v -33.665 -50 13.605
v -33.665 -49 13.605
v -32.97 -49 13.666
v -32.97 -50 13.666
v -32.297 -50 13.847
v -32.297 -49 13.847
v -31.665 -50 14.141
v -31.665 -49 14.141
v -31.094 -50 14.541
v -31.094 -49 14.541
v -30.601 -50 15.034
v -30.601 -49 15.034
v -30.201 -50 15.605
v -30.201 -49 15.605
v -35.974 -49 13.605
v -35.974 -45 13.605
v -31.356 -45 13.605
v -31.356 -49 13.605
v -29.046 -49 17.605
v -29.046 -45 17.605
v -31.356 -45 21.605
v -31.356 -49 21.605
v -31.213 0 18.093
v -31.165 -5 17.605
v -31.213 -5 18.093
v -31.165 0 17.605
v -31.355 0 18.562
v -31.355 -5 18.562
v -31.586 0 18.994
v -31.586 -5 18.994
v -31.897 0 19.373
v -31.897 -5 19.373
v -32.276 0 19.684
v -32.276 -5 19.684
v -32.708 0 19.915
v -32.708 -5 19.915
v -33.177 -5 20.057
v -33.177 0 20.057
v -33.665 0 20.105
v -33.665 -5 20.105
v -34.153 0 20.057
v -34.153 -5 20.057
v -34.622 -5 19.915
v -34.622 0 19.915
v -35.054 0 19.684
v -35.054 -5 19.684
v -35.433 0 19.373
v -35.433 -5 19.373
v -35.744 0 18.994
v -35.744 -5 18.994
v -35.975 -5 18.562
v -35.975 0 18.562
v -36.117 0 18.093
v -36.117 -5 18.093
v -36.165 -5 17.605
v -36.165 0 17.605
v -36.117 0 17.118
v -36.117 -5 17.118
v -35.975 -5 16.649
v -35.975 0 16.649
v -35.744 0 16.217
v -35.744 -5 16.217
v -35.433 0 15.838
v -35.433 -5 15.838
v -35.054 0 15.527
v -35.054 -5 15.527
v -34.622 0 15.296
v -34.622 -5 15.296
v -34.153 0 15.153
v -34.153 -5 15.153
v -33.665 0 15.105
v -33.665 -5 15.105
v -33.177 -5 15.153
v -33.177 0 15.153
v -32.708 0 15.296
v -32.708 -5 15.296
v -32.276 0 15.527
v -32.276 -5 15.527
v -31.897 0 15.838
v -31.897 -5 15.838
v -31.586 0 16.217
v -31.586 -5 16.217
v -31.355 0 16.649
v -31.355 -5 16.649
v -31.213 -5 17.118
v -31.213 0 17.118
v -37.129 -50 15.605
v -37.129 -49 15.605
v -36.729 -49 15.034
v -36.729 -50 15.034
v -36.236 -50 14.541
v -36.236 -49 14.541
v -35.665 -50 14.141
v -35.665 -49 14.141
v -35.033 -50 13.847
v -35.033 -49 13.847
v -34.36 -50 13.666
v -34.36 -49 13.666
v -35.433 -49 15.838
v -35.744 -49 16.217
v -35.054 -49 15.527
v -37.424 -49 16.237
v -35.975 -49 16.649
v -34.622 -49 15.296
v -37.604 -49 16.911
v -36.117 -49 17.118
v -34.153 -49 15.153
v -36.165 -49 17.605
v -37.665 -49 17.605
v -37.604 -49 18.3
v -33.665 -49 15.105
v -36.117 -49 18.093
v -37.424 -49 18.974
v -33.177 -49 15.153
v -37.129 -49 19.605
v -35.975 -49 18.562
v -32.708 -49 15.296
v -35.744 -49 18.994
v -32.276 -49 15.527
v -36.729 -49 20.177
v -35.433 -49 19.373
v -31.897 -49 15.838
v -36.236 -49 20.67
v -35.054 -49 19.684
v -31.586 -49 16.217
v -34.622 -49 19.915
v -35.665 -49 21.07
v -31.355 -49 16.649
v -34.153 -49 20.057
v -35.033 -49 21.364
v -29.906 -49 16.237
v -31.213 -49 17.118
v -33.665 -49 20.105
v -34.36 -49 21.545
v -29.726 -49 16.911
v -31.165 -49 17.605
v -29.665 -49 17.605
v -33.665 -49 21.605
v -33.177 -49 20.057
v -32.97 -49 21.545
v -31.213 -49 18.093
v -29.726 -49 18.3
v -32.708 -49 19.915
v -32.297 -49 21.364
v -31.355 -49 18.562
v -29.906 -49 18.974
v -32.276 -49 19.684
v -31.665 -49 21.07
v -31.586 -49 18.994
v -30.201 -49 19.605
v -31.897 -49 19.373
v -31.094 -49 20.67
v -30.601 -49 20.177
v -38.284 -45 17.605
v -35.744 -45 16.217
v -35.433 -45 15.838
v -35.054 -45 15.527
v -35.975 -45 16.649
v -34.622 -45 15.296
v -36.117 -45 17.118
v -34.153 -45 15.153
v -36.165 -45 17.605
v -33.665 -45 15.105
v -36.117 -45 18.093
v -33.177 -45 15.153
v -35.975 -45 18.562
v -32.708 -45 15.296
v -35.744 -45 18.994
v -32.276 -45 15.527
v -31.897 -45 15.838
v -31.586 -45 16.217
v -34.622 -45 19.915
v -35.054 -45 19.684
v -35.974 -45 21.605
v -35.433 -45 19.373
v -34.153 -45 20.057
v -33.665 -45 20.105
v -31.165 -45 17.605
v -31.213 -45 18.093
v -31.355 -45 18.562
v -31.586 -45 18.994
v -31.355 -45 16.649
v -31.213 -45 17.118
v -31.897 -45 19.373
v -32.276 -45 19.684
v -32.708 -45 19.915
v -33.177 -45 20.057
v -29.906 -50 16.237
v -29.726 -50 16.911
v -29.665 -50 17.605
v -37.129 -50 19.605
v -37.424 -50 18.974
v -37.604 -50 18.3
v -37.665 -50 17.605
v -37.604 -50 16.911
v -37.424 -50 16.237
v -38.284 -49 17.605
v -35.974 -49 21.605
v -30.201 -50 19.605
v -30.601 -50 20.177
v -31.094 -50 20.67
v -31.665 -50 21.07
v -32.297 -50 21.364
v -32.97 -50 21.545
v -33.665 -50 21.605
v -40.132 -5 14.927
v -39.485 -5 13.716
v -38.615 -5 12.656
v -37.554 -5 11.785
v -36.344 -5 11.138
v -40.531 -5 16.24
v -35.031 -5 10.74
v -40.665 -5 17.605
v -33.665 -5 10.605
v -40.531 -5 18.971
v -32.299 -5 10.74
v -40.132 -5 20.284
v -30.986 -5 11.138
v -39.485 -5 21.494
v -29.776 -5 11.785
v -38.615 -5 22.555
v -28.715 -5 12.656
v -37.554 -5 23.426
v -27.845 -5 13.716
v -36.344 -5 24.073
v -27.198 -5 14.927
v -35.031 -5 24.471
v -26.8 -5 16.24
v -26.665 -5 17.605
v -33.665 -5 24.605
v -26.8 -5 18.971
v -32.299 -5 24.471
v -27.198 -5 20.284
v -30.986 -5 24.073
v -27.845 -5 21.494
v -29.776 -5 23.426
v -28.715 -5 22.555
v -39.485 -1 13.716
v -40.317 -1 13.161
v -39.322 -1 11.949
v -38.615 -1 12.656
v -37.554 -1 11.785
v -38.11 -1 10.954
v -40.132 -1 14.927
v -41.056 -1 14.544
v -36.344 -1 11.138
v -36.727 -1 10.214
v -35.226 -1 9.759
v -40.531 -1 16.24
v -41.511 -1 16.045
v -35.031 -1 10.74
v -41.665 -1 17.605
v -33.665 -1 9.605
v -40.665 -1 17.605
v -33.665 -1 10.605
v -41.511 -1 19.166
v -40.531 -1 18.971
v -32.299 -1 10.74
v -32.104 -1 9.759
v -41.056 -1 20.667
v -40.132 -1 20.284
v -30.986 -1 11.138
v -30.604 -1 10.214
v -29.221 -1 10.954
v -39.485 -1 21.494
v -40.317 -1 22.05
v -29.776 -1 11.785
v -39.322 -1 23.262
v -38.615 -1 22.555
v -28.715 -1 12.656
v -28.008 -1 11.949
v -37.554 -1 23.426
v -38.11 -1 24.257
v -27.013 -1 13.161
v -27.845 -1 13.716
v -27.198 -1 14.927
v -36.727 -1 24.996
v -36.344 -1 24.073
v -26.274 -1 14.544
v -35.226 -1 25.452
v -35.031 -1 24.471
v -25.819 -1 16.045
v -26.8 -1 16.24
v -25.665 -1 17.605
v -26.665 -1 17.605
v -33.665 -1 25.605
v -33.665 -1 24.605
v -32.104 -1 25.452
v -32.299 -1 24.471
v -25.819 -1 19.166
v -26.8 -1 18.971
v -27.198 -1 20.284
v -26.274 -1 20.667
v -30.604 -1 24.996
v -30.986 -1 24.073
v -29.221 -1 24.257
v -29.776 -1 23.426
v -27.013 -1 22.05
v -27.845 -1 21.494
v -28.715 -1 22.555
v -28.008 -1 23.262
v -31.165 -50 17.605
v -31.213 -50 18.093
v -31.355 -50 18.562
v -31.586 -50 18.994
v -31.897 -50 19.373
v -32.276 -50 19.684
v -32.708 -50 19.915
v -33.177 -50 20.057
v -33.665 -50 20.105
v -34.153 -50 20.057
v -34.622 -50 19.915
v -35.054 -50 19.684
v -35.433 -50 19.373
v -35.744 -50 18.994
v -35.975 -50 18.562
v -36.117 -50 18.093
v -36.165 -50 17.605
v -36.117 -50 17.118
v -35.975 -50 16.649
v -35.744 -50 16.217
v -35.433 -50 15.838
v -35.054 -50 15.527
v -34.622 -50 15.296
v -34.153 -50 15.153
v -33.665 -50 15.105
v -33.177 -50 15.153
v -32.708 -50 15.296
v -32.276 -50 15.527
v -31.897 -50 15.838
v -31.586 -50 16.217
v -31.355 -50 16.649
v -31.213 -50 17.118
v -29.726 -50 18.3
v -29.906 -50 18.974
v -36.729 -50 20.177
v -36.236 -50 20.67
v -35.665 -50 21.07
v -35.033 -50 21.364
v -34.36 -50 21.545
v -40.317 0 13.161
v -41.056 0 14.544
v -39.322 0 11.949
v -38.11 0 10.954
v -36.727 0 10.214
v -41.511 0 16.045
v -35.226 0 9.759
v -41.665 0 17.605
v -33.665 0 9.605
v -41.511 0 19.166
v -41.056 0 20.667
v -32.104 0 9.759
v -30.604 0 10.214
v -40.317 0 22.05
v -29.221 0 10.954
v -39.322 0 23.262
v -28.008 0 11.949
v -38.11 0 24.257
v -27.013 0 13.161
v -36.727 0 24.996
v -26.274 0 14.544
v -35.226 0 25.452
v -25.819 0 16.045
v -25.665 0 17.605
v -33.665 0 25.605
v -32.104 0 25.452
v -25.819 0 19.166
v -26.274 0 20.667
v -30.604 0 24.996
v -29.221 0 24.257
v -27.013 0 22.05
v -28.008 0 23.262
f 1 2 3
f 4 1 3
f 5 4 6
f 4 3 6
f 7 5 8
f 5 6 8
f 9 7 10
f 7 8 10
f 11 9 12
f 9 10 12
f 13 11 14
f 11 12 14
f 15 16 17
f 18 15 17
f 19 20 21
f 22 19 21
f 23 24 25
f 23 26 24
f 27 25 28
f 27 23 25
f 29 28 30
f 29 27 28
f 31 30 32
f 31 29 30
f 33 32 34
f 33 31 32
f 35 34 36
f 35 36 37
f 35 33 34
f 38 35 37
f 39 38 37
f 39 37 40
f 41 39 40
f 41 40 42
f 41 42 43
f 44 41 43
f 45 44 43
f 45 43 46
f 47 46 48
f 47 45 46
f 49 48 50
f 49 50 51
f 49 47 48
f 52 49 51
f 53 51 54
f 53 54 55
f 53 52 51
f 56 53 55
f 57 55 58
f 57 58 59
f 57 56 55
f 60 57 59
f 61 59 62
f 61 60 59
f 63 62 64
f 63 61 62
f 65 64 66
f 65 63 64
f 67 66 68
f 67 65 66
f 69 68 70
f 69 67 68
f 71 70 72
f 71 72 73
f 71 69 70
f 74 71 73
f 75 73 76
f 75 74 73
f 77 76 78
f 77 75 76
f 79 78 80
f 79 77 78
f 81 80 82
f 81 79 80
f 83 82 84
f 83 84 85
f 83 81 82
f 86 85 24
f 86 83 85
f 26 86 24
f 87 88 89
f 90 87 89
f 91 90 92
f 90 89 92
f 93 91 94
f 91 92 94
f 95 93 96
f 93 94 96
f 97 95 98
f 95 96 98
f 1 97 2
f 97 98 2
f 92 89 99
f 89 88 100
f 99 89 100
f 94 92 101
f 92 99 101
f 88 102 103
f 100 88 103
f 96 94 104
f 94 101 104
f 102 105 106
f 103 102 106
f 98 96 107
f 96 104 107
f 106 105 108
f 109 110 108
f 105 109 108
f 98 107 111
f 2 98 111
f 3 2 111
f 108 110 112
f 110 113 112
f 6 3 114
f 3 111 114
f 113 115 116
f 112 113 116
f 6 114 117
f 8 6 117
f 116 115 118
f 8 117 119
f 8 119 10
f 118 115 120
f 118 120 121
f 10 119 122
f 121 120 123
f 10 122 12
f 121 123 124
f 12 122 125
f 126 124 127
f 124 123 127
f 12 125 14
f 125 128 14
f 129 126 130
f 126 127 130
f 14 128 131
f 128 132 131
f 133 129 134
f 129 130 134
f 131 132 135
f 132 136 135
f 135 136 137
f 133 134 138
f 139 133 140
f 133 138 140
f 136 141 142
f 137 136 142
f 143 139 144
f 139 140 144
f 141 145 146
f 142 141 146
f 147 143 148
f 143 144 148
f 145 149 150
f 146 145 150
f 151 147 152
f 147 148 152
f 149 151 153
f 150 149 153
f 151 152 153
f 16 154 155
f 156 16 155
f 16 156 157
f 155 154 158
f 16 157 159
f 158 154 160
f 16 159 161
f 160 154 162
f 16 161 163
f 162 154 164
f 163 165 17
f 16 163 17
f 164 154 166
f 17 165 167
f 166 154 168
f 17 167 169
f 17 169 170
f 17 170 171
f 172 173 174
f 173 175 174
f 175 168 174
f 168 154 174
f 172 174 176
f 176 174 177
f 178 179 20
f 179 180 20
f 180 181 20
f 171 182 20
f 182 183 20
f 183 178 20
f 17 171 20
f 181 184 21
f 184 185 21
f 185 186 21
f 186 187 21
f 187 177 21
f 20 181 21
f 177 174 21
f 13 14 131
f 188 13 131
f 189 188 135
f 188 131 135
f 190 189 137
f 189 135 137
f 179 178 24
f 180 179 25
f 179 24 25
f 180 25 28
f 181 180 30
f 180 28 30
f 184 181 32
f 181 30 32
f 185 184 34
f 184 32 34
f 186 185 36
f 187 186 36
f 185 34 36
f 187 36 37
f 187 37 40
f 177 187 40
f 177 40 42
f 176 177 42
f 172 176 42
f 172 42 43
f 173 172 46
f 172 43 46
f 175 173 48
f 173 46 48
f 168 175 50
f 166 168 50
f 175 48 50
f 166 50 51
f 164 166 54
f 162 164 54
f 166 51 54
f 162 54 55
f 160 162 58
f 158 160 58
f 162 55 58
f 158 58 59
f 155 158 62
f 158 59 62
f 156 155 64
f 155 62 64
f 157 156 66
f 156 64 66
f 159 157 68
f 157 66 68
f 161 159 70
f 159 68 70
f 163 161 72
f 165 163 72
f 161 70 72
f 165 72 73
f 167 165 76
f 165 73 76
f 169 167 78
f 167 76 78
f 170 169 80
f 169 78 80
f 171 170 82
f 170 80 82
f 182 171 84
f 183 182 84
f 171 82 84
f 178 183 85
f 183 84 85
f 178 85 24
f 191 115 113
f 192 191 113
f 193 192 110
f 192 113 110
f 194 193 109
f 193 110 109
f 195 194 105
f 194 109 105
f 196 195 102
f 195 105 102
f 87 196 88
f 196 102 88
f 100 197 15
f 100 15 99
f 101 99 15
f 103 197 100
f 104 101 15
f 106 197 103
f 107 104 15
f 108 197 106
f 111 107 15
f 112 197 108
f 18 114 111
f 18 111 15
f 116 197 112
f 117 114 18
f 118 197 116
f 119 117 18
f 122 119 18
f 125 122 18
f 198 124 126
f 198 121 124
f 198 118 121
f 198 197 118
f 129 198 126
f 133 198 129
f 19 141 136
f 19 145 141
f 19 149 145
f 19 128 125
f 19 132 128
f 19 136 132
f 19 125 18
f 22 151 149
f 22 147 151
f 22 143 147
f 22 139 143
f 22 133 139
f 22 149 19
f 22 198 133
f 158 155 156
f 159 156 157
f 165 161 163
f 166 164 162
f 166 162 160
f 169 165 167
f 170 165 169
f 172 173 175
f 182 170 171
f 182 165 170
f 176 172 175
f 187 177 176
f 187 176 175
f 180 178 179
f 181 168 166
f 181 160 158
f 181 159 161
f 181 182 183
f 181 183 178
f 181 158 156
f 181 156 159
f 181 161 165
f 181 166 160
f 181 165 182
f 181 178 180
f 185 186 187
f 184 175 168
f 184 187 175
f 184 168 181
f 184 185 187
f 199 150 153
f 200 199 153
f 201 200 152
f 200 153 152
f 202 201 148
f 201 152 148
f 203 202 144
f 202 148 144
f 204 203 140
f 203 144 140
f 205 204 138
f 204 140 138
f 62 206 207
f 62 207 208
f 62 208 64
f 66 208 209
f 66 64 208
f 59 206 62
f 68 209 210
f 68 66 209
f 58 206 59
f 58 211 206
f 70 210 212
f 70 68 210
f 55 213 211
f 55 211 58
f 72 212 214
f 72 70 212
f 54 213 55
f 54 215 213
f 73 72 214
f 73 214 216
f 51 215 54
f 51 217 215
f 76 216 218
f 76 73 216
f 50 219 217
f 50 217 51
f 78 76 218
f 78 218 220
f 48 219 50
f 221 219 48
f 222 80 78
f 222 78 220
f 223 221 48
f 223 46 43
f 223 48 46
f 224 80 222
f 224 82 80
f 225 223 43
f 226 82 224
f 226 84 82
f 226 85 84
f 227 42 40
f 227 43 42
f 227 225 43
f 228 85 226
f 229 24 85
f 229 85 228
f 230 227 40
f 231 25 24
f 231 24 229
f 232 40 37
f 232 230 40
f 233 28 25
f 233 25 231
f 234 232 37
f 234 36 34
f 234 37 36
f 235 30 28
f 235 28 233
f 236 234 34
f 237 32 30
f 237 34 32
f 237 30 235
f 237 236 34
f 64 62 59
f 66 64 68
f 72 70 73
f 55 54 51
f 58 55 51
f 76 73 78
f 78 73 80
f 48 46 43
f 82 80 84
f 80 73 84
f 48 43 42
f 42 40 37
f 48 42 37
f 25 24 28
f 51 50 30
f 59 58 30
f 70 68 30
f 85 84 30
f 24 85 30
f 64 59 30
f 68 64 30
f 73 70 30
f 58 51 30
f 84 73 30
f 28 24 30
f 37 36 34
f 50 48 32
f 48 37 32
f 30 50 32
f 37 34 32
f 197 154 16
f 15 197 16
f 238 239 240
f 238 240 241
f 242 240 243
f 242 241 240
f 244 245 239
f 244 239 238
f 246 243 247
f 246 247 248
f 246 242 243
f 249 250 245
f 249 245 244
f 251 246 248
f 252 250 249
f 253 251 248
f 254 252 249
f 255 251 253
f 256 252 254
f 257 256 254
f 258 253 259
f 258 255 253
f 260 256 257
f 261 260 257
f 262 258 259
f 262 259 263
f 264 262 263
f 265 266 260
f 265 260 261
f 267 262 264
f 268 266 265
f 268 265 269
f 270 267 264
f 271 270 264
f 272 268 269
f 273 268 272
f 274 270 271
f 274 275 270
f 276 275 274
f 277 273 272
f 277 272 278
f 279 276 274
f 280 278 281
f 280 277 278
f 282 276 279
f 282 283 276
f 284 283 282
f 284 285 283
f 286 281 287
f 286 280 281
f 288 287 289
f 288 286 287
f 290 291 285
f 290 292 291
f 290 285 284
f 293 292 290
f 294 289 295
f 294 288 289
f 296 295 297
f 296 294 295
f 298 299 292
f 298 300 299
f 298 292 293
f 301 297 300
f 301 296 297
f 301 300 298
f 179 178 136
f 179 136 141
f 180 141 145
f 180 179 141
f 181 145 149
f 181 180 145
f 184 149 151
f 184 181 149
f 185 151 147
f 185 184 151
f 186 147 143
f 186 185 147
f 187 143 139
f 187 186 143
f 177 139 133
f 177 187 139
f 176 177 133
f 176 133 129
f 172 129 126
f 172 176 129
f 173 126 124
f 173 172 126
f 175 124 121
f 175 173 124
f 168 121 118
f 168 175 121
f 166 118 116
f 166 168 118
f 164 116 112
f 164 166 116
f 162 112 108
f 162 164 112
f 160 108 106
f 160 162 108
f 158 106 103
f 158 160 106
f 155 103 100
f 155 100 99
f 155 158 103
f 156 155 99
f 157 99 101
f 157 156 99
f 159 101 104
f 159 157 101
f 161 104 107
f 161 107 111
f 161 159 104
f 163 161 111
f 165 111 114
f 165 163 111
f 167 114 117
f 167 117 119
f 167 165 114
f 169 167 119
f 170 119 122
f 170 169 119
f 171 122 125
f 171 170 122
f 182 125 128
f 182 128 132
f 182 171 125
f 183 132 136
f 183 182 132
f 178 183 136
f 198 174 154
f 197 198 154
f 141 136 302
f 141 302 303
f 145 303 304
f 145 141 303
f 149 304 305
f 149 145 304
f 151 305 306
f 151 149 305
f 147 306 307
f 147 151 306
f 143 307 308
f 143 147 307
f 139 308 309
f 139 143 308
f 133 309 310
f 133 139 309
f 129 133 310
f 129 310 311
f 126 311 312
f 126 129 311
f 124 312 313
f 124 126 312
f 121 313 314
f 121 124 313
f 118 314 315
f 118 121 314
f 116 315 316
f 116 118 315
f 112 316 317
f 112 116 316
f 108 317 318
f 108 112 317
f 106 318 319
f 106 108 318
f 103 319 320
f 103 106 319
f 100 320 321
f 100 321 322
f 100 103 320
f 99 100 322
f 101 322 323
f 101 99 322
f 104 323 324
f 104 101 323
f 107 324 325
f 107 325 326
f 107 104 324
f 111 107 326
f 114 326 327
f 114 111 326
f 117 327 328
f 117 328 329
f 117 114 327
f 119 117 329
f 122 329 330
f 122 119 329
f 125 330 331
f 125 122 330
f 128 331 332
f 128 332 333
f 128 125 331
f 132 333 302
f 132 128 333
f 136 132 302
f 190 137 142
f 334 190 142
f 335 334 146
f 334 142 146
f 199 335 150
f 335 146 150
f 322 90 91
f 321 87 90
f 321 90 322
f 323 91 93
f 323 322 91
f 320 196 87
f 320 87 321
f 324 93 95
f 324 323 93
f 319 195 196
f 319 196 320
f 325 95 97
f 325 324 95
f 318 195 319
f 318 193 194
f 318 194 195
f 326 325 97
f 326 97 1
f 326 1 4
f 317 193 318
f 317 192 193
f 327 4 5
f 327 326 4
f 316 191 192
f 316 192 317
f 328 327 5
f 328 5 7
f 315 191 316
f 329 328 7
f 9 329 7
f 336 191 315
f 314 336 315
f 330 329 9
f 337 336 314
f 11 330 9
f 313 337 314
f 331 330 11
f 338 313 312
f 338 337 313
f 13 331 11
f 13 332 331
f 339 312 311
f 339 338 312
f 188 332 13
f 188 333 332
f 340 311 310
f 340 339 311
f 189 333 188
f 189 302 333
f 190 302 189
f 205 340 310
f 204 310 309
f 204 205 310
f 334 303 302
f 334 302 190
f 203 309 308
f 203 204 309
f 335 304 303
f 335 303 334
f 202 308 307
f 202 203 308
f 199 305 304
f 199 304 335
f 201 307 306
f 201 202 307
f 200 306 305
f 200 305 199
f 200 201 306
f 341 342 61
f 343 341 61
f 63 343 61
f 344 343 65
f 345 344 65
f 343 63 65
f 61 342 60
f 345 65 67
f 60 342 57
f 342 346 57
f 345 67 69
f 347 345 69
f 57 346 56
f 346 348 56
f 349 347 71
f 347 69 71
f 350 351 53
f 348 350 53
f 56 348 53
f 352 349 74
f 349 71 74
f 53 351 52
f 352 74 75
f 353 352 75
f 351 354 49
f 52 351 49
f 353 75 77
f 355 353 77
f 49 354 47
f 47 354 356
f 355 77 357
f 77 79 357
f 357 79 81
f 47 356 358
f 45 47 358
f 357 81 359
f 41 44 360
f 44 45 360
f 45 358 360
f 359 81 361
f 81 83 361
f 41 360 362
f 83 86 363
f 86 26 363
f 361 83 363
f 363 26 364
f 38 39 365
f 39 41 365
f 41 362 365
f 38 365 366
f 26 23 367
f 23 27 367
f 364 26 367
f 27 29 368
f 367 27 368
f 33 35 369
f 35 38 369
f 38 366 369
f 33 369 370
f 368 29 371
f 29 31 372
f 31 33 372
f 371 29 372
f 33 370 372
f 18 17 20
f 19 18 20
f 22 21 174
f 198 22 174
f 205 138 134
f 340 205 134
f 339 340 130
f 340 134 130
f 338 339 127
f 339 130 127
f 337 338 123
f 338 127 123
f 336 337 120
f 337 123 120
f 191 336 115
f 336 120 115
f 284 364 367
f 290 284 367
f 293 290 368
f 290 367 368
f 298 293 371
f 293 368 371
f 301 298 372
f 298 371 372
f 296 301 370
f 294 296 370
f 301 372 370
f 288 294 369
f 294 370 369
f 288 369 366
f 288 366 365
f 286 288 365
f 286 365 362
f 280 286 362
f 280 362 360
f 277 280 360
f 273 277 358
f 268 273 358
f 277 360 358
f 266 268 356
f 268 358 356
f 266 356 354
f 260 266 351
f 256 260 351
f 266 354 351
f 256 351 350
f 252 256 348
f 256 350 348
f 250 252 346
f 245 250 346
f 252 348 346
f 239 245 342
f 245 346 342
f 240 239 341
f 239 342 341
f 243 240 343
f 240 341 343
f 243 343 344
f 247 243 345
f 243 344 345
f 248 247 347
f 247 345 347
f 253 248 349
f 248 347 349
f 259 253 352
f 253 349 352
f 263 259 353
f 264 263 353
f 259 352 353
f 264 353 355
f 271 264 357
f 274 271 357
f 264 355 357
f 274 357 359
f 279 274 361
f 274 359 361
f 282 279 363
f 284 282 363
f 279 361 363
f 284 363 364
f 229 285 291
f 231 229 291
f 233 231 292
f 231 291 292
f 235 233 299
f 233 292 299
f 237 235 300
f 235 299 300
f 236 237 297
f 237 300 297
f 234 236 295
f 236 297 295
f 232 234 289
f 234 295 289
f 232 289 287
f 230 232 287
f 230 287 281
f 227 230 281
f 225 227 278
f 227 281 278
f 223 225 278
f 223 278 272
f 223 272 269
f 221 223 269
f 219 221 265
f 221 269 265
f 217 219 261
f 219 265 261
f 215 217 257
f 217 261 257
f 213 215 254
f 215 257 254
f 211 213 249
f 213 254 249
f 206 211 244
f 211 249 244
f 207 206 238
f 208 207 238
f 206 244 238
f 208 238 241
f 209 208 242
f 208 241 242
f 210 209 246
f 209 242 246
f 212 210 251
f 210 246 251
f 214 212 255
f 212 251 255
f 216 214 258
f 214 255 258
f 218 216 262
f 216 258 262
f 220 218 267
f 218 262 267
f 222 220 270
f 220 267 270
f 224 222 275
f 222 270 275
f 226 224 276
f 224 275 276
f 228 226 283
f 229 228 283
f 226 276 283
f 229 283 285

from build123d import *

# Parameters (mm, degrees)
F0_R     = 8
F0_R_2   = 2.5
F1_DEPTH = 1
F2_R     = 7
F2_R_2   = 2.5
F3_DEPTH = 4
F4_R     = 2.5
F5_DEPTH = 40
F6_R     = 2.5
F7_DEPTH = 4
F8_R     = 2.5
F9_DEPTH = 1


with BuildPart() as f1:
    # F0 (on Front) → F1 (new body)
    with BuildSketch(Plane.XZ):
        with Locations((-33.665091, 17.605426)):
            Circle(F0_R)
        with Locations((-33.665091, 17.605426)):
            Circle(F0_R_2, mode=Mode.SUBTRACT)
    extrude(amount=F1_DEPTH)

    # F2 (on face) → F3 (join)
    with BuildSketch(Plane.XZ.offset(1)):
        with Locations((-33.665091, 17.605426)):
            Circle(F2_R)
        with Locations((-33.665091, 17.605426)):
            Circle(F2_R_2, mode=Mode.SUBTRACT)
    extrude(amount=F3_DEPTH)


with BuildPart() as f5:
    # F4 (on face) → F5 (new body)
    with BuildSketch(Plane.XZ.offset(5)):
        with Locations((-33.665091, 17.605426)):
            Circle(F4_R)
    extrude(amount=F5_DEPTH)


with BuildPart() as f7:
    # F6 (on face) → F7 (new body)
    with BuildSketch(Plane.XZ.offset(45)):
        Polygon((-31.35569, 13.605426), (-29.046289, 17.605426), (-31.35569, 21.605426), (-35.974492, 21.605426), (-38.283893, 17.605426), (-35.974492, 13.605426), align=None)
        with Locations((-33.665091, 17.605426)):
            Circle(F6_R, mode=Mode.SUBTRACT)
    extrude(amount=F7_DEPTH)


with BuildPart() as f9:
    # F8 (on face) → F9 (new body)
    with BuildSketch(Plane.XZ.offset(49)):
        with BuildLine():
            ThreePointArc((-30.200989, 15.605426), (-29.801387, 16.57015), (-29.665091, 17.605426))
            ThreePointArc((-29.665091, 17.605426), (-29.801387, 18.640702), (-30.200989, 19.605426))
            ThreePointArc((-30.200989, 19.605426), (-31.665091, 21.069527), (-33.665091, 21.605426))
            ThreePointArc((-33.665091, 21.605426), (-35.665091, 21.069527), (-37.129192, 19.605426))
            ThreePointArc((-37.129192, 19.605426), (-37.665091, 17.605426), (-37.129192, 15.605426))
            ThreePointArc((-37.129192, 15.605426), (-35.665091, 14.141324), (-33.665091, 13.605426))
            ThreePointArc((-33.665091, 13.605426), (-31.665091, 14.141324), (-30.200989, 15.605426))
        make_face()
        with Locations((-33.665091, 17.605426)):
            Circle(F8_R, mode=Mode.SUBTRACT)
    extrude(amount=F9_DEPTH)


solid = Compound([f1.part, f5.part, f7.part, f9.part])
